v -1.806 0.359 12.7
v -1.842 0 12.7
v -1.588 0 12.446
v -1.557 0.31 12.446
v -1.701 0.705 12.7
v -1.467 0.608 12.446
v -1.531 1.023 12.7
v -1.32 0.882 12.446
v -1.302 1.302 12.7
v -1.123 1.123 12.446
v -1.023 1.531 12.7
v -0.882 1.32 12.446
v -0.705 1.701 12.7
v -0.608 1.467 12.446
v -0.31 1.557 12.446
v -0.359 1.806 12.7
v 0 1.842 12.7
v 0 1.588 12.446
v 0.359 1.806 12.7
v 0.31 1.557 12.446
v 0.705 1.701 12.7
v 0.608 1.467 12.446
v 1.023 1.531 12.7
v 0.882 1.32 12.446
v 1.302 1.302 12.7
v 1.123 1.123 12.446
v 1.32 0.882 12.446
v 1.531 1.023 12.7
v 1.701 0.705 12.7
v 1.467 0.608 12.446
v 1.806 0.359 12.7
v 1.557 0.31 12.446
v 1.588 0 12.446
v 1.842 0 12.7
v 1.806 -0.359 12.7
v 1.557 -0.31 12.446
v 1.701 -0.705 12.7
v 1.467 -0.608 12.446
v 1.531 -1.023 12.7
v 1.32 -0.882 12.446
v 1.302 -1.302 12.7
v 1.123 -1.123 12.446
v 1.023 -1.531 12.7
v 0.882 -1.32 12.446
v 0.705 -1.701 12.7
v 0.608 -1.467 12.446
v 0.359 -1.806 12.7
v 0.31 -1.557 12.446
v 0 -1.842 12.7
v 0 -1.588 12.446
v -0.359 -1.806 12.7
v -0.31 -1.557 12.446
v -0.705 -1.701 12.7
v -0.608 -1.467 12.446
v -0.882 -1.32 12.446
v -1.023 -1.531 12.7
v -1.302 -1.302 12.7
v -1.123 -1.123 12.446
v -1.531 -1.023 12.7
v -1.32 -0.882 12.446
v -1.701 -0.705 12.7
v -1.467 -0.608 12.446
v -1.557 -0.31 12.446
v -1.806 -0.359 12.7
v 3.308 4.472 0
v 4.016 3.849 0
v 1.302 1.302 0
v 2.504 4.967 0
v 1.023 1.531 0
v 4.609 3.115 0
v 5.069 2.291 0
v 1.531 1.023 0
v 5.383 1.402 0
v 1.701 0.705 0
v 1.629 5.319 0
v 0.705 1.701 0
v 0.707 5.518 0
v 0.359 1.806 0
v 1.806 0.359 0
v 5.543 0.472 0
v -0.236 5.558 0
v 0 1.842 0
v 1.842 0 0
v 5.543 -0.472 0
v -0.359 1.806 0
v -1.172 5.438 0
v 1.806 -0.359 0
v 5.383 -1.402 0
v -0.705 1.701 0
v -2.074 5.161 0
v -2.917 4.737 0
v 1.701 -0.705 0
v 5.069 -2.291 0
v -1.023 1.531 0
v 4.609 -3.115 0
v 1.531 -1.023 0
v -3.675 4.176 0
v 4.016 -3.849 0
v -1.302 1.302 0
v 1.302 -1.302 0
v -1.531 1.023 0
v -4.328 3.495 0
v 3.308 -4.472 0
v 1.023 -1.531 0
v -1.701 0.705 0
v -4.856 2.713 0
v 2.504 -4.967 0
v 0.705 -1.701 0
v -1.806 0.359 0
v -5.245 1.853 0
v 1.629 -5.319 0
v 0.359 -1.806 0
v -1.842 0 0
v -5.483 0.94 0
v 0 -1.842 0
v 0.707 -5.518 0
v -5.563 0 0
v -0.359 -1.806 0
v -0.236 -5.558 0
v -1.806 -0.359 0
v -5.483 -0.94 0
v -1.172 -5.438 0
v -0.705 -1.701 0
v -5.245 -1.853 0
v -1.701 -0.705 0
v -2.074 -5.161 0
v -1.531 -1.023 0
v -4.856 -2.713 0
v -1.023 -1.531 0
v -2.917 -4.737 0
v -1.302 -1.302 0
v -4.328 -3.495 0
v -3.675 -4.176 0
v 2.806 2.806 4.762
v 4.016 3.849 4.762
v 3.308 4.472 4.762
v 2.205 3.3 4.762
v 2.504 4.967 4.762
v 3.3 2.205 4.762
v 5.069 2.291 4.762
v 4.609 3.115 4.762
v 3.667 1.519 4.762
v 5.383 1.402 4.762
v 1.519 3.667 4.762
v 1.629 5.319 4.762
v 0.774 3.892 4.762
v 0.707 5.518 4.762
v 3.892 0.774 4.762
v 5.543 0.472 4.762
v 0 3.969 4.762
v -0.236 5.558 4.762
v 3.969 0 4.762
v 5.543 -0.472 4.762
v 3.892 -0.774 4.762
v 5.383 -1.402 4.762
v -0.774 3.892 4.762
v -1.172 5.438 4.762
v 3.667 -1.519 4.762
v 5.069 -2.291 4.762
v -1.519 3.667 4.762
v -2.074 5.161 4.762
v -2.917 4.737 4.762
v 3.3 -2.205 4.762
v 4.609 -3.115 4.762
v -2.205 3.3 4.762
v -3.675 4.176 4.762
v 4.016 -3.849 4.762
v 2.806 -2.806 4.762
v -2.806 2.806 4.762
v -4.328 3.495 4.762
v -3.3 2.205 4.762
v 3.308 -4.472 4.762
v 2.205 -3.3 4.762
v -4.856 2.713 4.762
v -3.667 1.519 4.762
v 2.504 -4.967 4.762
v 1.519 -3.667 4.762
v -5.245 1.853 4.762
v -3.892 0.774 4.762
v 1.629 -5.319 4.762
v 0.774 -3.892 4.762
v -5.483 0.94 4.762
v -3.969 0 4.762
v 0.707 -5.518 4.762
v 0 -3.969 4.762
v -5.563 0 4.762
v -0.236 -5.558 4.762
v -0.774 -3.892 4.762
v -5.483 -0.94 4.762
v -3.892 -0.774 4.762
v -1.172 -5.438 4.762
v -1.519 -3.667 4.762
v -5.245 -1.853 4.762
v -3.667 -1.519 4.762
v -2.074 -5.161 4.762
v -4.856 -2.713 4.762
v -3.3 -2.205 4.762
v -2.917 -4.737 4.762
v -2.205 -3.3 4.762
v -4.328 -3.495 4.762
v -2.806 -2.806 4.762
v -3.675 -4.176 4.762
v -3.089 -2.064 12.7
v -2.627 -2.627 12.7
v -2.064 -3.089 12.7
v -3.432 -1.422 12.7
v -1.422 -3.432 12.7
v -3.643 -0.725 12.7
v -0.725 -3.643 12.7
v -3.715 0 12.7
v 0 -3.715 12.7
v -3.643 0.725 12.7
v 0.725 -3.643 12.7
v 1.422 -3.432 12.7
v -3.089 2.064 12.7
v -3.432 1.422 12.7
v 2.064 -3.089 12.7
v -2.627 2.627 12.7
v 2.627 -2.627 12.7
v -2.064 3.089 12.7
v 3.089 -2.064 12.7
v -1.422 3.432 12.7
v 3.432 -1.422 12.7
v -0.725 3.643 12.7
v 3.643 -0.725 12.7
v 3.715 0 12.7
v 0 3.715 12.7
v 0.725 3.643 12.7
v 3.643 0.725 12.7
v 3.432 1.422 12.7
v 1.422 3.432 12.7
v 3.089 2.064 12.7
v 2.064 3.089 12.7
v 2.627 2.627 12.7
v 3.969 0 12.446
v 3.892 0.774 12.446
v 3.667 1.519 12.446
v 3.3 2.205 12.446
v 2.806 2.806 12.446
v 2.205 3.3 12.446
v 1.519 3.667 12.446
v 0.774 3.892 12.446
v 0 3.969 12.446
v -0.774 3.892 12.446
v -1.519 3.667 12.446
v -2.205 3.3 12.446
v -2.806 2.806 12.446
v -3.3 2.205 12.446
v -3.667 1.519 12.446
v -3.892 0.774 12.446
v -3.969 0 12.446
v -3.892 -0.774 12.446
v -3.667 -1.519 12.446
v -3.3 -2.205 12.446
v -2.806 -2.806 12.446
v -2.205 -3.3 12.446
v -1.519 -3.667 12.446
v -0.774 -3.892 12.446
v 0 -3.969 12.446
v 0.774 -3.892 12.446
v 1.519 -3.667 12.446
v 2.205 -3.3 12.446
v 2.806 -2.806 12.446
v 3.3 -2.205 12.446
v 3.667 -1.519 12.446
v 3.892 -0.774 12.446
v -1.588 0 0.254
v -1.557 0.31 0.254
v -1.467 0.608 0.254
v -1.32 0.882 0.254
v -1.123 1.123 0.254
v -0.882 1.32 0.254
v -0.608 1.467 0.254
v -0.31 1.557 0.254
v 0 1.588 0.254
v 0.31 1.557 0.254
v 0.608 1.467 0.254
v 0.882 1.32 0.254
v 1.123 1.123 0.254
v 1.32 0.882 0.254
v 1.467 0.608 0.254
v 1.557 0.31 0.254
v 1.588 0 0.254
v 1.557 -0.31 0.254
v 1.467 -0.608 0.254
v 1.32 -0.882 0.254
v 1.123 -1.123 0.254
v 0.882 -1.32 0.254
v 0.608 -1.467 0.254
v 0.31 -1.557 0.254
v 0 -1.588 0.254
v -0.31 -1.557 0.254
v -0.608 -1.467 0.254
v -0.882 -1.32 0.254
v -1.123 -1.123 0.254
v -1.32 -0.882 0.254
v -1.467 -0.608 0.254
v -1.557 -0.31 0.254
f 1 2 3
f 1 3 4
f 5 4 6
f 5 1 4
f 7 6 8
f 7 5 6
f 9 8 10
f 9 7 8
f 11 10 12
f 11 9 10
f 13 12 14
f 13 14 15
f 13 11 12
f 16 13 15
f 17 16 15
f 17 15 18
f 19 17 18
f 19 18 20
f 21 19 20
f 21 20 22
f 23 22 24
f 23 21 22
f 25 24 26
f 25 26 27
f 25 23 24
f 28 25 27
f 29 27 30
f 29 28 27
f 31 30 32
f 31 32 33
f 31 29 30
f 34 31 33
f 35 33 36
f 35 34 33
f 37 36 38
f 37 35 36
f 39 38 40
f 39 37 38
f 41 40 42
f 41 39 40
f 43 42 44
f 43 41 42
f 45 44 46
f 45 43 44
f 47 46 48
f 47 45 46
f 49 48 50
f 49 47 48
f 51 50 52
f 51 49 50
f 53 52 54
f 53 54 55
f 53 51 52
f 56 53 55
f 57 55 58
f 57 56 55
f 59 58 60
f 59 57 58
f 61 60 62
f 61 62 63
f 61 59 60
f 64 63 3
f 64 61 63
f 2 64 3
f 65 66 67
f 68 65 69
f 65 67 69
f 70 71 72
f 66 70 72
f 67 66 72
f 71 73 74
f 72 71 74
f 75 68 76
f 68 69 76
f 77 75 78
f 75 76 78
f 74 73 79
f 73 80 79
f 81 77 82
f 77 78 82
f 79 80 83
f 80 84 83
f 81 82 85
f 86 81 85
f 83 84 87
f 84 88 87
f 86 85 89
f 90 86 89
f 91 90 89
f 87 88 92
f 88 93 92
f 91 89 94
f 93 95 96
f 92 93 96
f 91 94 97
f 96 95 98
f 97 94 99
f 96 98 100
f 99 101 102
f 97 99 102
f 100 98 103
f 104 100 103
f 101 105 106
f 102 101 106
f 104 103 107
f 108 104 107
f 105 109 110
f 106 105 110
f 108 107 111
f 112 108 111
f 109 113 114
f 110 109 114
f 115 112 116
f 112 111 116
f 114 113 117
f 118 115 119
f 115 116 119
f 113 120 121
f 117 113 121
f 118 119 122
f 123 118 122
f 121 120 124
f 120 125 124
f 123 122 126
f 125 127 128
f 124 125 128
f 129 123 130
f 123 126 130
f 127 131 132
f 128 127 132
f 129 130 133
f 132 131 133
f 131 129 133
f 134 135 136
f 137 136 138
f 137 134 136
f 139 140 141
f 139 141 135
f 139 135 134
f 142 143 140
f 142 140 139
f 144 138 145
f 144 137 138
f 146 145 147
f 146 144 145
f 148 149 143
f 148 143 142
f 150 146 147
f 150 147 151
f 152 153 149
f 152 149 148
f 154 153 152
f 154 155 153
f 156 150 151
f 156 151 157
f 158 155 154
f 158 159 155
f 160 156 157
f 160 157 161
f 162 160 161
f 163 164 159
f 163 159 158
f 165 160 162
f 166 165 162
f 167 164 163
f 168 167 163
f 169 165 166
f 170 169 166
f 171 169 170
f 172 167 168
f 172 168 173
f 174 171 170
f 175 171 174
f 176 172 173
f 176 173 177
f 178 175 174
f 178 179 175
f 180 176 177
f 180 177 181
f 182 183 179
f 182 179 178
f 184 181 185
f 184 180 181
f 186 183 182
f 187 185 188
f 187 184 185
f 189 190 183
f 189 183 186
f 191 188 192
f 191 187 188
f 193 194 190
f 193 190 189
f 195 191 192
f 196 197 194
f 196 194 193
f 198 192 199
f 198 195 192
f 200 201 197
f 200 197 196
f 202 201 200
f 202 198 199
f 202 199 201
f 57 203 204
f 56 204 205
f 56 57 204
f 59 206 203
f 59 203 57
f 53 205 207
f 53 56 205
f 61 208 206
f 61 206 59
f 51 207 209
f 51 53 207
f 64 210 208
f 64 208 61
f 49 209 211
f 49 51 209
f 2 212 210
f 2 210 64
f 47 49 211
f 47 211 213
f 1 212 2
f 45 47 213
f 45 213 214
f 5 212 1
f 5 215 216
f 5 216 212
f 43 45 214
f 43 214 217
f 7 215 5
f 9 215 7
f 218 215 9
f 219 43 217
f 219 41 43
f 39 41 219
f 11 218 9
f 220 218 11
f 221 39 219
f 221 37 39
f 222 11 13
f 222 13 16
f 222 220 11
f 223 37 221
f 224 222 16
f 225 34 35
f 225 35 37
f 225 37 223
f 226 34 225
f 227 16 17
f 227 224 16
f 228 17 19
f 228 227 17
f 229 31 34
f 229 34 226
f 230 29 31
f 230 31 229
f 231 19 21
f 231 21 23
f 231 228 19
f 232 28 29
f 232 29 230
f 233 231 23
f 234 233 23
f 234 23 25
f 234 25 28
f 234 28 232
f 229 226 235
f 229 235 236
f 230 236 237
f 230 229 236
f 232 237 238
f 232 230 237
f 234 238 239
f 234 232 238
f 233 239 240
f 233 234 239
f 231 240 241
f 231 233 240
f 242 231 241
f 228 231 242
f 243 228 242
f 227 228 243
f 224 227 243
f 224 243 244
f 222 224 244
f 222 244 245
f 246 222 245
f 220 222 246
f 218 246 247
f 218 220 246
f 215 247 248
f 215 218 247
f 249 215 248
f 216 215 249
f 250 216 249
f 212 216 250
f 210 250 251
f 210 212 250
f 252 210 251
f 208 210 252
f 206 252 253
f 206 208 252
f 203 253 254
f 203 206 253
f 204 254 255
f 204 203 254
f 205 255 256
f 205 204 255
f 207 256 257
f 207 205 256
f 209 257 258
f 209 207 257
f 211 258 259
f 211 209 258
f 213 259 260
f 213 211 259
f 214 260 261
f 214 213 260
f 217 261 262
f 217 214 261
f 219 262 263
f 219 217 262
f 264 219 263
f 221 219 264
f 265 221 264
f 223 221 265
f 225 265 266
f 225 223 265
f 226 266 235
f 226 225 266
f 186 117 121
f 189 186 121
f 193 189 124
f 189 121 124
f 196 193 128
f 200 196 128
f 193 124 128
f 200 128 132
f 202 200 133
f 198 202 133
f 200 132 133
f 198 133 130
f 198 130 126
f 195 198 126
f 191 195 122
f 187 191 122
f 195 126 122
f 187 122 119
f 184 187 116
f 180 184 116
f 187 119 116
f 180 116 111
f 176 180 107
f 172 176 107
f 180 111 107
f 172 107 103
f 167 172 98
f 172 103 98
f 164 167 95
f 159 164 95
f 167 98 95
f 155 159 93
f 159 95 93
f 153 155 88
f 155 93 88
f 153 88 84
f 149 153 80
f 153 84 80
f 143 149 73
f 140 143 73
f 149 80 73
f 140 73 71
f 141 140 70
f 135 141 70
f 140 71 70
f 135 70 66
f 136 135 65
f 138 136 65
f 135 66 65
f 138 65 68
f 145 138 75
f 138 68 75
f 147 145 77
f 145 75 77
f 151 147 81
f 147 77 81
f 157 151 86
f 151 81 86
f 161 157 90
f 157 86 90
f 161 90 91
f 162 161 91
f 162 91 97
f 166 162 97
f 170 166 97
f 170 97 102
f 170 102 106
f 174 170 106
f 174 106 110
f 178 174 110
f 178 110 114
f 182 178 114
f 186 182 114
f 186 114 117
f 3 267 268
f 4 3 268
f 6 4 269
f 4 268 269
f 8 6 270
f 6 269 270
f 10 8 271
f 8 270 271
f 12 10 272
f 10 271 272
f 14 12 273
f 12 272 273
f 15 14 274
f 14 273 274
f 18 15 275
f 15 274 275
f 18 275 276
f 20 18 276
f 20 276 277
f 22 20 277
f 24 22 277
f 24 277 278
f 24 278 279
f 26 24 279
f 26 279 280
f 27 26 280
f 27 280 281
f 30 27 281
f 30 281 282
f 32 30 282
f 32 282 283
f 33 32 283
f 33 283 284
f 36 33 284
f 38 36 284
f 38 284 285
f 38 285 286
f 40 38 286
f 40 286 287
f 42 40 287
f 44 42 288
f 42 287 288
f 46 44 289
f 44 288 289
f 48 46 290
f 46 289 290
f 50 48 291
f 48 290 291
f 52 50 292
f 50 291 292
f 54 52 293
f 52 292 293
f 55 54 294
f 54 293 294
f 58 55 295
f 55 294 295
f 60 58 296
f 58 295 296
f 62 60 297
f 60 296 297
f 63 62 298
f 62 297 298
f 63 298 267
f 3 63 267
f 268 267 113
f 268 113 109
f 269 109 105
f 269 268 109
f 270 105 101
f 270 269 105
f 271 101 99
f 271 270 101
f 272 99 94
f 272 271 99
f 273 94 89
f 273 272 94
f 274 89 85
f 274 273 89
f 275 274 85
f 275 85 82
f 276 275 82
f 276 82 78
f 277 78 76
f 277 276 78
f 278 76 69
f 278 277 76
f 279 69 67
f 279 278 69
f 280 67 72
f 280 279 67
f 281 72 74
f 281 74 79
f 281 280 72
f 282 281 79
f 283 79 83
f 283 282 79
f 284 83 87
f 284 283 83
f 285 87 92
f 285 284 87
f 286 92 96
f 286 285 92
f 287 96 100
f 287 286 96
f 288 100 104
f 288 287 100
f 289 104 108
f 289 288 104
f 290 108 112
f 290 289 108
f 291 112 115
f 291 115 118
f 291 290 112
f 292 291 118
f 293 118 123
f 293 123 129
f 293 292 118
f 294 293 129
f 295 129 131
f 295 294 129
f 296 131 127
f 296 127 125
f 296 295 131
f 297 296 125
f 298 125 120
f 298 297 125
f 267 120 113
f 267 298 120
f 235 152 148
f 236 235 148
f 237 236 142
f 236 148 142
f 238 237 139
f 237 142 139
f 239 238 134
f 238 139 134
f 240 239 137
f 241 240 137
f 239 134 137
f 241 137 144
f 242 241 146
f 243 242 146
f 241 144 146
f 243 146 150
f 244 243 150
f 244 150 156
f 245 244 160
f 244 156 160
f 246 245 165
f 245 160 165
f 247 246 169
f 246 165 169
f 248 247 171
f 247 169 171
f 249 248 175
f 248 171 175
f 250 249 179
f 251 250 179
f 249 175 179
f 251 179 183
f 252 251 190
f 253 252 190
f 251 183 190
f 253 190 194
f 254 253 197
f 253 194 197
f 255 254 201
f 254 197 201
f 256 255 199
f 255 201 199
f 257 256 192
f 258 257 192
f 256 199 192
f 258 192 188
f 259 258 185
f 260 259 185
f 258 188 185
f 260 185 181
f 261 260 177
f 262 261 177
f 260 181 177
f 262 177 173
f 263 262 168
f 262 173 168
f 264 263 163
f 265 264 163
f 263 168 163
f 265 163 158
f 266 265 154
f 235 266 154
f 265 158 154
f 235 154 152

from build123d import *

# Parameters (mm, degrees)
SKETCH1_R           = 5.5626
BOSS_EXTRUDE1_DEPTH = 4.7625
SKETCH2_R           = 3.96875
BOSS_EXTRUDE2_DEPTH = 7.9375
SKETCH3_R           = 1.5875
CUT_EXTRUDE1_DEPTH  = 15.939044063
CHAMFER1_SIZE       = 0.254


with BuildPart() as part:
    # Sketch1 → Boss-Extrude1 (new body)
    with BuildSketch(Plane.XY):
        with Locations(Location((0, 0, 0), (0, 0, 180))):
            Circle(SKETCH1_R)
    extrude(amount=BOSS_EXTRUDE1_DEPTH)

    # Sketch2 → Boss-Extrude2 (add)
    with BuildSketch(Plane.XY.offset(4.7625)):
        Circle(SKETCH2_R)
    extrude(amount=BOSS_EXTRUDE2_DEPTH)

    # Sketch3 → Cut-Extrude1 (cut, through all)
    with BuildSketch(Plane(origin=(0, 0, 0), x_dir=(-1, 0, 0), z_dir=(0, 0, -1))):
        Circle(SKETCH3_R)
    extrude(amount=-CUT_EXTRUDE1_DEPTH, mode=Mode.SUBTRACT)

    # Chamfer1
    chamfer1_edges = [part.edges().sort_by_distance(p)[0] for p in [
        (1.5875, 0, 12.7),
        (1.5875, 0, 0),
        (-3.96875, 0, 12.7),
    ]]
    chamfer(chamfer1_edges, length=CHAMFER1_SIZE)


solid = part.part
